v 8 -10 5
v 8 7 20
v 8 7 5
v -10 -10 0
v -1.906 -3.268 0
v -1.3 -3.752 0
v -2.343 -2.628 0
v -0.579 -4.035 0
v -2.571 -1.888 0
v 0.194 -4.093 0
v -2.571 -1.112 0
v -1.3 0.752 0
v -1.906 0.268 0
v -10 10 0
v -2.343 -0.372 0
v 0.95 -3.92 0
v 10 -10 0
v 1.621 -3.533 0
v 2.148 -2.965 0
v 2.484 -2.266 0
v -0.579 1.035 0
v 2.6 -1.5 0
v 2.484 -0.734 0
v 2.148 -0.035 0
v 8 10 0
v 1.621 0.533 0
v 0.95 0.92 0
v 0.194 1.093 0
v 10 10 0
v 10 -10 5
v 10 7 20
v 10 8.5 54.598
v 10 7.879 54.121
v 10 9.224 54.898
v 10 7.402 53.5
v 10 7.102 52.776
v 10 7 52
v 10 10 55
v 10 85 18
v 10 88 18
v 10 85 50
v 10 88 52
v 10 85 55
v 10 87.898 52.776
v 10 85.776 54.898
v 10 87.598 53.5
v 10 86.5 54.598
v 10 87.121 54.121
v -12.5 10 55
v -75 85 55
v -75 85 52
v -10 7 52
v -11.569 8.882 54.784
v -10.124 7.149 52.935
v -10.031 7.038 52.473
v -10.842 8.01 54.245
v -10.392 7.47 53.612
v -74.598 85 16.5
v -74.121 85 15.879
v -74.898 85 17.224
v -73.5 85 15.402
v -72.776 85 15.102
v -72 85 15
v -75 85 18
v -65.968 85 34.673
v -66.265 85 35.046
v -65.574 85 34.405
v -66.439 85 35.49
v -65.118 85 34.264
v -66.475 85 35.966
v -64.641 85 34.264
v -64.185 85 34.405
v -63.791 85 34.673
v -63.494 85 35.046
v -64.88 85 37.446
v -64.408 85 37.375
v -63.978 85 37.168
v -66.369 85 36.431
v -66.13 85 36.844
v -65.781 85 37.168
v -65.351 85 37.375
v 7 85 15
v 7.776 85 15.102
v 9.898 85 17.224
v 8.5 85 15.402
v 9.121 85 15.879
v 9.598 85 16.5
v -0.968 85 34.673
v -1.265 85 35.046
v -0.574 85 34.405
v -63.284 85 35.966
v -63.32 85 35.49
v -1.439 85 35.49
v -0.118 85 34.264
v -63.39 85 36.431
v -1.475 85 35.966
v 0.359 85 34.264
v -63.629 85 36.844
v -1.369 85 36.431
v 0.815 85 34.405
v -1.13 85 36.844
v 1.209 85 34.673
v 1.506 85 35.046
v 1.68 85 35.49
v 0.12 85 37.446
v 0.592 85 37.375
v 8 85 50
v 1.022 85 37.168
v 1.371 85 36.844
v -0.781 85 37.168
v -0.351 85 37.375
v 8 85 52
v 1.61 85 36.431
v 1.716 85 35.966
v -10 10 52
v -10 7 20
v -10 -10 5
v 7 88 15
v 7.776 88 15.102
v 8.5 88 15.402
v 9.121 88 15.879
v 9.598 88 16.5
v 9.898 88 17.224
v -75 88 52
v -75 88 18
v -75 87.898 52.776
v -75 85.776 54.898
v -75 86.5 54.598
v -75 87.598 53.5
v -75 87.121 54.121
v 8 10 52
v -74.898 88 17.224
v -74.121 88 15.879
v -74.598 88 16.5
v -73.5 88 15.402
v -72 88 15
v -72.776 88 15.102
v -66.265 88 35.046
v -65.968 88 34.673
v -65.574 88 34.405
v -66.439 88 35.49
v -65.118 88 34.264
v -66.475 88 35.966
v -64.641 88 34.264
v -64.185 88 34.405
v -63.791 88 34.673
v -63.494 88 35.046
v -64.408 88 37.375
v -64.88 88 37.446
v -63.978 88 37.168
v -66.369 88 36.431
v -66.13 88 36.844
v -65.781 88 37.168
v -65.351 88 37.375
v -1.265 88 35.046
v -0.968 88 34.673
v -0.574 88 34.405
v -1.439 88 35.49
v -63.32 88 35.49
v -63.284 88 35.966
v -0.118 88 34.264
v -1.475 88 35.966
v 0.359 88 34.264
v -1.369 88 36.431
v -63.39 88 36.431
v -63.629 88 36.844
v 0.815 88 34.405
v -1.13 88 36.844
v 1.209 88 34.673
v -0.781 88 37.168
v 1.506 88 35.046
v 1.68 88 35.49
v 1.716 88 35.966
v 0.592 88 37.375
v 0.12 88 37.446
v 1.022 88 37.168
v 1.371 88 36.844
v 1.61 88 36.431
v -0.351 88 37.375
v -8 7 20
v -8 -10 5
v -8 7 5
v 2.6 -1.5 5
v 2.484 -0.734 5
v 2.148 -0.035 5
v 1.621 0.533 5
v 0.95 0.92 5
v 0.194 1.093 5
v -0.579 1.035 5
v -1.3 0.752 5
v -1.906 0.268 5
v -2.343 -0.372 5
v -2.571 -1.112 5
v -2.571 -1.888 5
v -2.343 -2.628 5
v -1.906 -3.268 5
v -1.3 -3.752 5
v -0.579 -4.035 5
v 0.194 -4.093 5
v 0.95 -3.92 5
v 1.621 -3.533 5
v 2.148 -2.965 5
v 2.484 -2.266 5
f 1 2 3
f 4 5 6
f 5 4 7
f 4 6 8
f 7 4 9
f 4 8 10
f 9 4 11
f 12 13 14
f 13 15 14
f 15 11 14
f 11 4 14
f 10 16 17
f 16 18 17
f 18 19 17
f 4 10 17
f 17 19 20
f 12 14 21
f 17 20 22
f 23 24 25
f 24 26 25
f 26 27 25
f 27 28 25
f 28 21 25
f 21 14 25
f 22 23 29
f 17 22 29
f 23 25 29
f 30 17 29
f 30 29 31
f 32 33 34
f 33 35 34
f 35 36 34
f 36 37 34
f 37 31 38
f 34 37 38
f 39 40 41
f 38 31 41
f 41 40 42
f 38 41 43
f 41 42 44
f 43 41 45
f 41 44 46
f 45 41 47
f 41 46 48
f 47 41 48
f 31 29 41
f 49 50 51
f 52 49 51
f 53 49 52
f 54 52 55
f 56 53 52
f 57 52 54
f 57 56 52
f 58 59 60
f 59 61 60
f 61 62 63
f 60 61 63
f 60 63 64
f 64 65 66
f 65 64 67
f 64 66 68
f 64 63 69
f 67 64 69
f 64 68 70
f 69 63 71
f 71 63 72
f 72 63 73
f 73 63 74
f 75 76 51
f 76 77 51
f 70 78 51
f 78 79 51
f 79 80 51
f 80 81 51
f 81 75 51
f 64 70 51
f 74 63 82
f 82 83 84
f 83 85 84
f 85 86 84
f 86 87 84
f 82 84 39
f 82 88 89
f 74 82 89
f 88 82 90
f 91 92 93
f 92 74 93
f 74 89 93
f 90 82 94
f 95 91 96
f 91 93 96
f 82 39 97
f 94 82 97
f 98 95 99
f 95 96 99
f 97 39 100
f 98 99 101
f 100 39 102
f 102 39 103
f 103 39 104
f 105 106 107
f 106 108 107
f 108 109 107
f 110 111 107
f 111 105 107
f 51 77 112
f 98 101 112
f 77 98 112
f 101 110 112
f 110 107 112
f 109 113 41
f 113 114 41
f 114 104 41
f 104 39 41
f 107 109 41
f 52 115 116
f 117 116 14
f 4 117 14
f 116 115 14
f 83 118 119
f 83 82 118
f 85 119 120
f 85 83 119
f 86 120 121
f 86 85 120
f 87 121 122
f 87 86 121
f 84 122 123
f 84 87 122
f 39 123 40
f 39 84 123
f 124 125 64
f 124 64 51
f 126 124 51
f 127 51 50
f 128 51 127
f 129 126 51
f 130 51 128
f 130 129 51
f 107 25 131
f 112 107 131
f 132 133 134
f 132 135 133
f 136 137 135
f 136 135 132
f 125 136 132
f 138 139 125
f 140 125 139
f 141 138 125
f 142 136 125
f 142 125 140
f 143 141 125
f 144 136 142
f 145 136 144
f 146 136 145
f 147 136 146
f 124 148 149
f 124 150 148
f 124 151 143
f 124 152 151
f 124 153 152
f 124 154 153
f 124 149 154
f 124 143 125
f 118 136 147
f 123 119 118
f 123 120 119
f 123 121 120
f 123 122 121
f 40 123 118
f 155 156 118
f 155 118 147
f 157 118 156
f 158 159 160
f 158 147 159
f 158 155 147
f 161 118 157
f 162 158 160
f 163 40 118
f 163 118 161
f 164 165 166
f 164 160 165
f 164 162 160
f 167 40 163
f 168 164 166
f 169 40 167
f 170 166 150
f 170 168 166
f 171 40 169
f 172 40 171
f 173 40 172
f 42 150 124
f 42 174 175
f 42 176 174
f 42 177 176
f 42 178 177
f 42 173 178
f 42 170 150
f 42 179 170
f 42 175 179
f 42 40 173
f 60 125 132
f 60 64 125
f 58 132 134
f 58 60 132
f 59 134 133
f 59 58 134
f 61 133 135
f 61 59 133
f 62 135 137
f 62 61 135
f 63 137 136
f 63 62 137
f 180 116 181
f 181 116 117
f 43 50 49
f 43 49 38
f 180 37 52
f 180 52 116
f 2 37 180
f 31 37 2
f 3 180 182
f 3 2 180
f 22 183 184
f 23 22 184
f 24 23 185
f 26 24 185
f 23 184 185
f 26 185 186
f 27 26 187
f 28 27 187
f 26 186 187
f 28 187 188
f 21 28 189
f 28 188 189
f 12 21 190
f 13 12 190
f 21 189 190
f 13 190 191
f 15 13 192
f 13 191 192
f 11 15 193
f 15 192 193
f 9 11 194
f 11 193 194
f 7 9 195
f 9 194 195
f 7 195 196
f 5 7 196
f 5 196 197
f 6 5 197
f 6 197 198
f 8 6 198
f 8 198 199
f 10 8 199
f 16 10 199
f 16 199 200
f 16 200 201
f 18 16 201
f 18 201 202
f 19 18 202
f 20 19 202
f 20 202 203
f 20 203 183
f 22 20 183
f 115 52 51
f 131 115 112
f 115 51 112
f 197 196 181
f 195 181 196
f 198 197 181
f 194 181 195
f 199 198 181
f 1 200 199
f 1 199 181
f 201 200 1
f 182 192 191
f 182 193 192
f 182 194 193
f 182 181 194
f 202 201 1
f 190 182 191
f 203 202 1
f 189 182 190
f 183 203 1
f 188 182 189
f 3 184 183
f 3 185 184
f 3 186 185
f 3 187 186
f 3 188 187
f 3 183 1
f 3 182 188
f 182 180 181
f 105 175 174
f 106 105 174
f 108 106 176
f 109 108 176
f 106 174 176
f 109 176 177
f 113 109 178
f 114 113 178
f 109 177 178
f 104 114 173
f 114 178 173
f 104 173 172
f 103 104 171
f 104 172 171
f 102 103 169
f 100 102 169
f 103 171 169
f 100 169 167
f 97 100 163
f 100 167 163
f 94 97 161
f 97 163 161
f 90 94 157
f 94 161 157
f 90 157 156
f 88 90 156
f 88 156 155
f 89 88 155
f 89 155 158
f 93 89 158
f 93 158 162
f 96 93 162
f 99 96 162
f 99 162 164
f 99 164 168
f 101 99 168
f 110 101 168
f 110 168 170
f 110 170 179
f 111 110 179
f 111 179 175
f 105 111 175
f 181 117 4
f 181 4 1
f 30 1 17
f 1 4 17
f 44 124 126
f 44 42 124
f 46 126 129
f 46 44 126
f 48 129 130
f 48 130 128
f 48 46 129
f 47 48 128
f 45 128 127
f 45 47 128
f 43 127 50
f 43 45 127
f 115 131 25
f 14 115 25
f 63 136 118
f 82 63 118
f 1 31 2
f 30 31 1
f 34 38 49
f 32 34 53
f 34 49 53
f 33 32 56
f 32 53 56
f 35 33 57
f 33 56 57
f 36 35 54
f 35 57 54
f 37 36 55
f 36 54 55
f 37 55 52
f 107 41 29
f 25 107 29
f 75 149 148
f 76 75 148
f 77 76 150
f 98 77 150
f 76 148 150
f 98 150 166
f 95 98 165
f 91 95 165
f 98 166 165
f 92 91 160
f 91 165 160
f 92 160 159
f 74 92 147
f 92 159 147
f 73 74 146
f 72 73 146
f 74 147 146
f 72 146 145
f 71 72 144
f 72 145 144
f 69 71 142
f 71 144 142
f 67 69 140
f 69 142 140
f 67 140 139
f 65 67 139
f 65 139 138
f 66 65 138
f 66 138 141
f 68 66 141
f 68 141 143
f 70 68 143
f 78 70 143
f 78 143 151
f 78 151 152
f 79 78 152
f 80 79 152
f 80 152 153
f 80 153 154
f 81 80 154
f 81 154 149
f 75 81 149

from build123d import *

# Parameters (mm, degrees)
SKETCH1_W            = 20
SKETCH1_H            = 20
BOSS_EXTRUDE1_DEPTH  = 5
SKETCH2_W            = 20
SKETCH2_H            = 3
BOSS_EXTRUDE2_DEPTH  = 20
BOSS_EXTRUDE3_DEPTH  = 2
BOSS_EXTRUDE4_DEPTH  = 2
SKETCH5_R            = 2.6
CUT_EXTRUDE1_DEPTH   = 21.615528128
SKETCH6_W            = 20
SKETCH6_H            = 3
BOSS_EXTRUDE5_DEPTH  = 5
SKETCH17_W           = 30
SKETCH17_H           = 3
BOSS_EXTRUDE14_DEPTH = 20
SKETCH18_W           = 13
SKETCH18_H           = 78
BOSS_EXTRUDE17_DEPTH = 20
SKETCH20_W           = 10
SKETCH20_H           = 78
CUT_EXTRUDE3_DEPTH   = 106.683489723
BOSS_EXTRUDE20_DEPTH = 2
SKETCH24_W           = 20
SKETCH24_H           = 3
BOSS_EXTRUDE21_DEPTH = 42
SKETCH25_W           = 45
SKETCH25_H           = 3
BOSS_EXTRUDE22_DEPTH = 65
SKETCH26_W           = 85
SKETCH26_H           = 5
CUT_EXTRUDE4_DEPTH   = 28
BOSS_EXTRUDE24_DEPTH = 3
SKETCH28_R           = 1.6
CUT_EXTRUDE6_DEPTH   = 7
FILLET4_R            = 3
FILLET5_R            = 3


with BuildPart() as part:
    # Sketch1 → Boss-Extrude1 (new body)
    with BuildSketch(Plane.XY):
        Rectangle(SKETCH1_W, SKETCH1_H)
    extrude(amount=BOSS_EXTRUDE1_DEPTH)

    # Sketch2 → Boss-Extrude2 (add)
    with BuildSketch(Plane.XY):
        with Locations((0, 8.5)):
            Rectangle(SKETCH2_W, SKETCH2_H)
    extrude(amount=BOSS_EXTRUDE2_DEPTH)

    # Sketch3 → Boss-Extrude3 (add)
    with BuildSketch(Plane.ZY.offset(10)):
        Polygon((20, 7), (5, -10), (5, 7), align=None)
    extrude(amount=-BOSS_EXTRUDE3_DEPTH)

    # Sketch4 → Boss-Extrude4 (add)
    with BuildSketch(Plane(origin=(10, 0, 0), x_dir=(0, 0, -1), z_dir=(1, 0, 0))):
        Polygon((-20, 7), (-5, -10), (-5, 7), align=None)
    extrude(amount=-BOSS_EXTRUDE4_DEPTH)

    # Sketch5 → Cut-Extrude1 (cut, through all)
    with BuildSketch(Plane.XY.offset(5)):
        with Locations((0, -1.5)):
            Circle(SKETCH5_R)
    extrude(amount=-CUT_EXTRUDE1_DEPTH, mode=Mode.SUBTRACT)

    # Sketch6 → Boss-Extrude5 (add)
    with BuildSketch(Plane.XY.offset(20)):
        with Locations((0, 8.5)):
            Rectangle(SKETCH6_W, SKETCH6_H)
    extrude(amount=BOSS_EXTRUDE5_DEPTH)

    # Sketch17 → Boss-Extrude14 (add)
    with BuildSketch(Plane(origin=(10, 0, 0), x_dir=(0, 0, -1), z_dir=(1, 0, 0))):
        with Locations((-40, 8.5)):
            Rectangle(SKETCH17_W, SKETCH17_H)
    extrude(amount=-BOSS_EXTRUDE14_DEPTH)

    # Sketch18 → Boss-Extrude17 (add)
    with BuildSketch(Plane(origin=(10, 0, 0), x_dir=(0, 0, -1), z_dir=(1, 0, 0))):
        with Locations((-48.5, 49)):
            Rectangle(SKETCH18_W, SKETCH18_H)
    extrude(amount=-BOSS_EXTRUDE17_DEPTH)

    # Sketch20 → Cut-Extrude3 (cut, through all)
    with BuildSketch(Plane(origin=(10, 0, 0), x_dir=(0, 0, -1), z_dir=(1, 0, 0))):
        with Locations((-47, 49)):
            Rectangle(SKETCH20_W, SKETCH20_H)
    extrude(amount=-CUT_EXTRUDE3_DEPTH, mode=Mode.SUBTRACT)

    # Sketch23 → Boss-Extrude20 (add)
    with BuildSketch(Plane(origin=(10, 0, 0), x_dir=(0, 0, -1), z_dir=(1, 0, 0))):
        Polygon((-52, 88), (0, 10), (-52, 10), align=None)
    extrude(amount=-BOSS_EXTRUDE20_DEPTH)

    # Sketch24 → Boss-Extrude21 (add)
    with BuildSketch(Plane(origin=(0, 0, 52), x_dir=(-1, 0, 0), z_dir=(0, 0, -1))):
        with Locations((0, 86.5)):
            Rectangle(SKETCH24_W, SKETCH24_H)
    extrude(amount=BOSS_EXTRUDE21_DEPTH)

    # Sketch25 → Boss-Extrude22 (add)
    with BuildSketch(Plane.ZY.offset(10)):
        with Locations((32.5, 86.5)):
            Rectangle(SKETCH25_W, SKETCH25_H)
    extrude(amount=BOSS_EXTRUDE22_DEPTH)

    # Sketch26 → Cut-Extrude4 (cut)
    with BuildSketch(Plane(origin=(0, 88, 0), x_dir=(1, 0, 0), z_dir=(0, 1, 0))):
        with Locations((-32.5, -12.5)):
            Rectangle(SKETCH26_W, SKETCH26_H)
    extrude(amount=-CUT_EXTRUDE4_DEPTH, mode=Mode.SUBTRACT)

    # Sketch27 → Boss-Extrude24 (add)
    with BuildSketch(Plane.XY.offset(55)):
        Polygon((-75, 85), (-10, 7), (-10, 85), align=None)
    extrude(amount=-BOSS_EXTRUDE24_DEPTH)

    # Sketch28 → Cut-Extrude6 (cut)
    with BuildSketch(Plane(origin=(0, 88, 0), x_dir=(1, 0, 0), z_dir=(0, 1, 0))):
        with Locations(Location((0.120495814, -35.846198104, 0), (0, 0, 270))):
            Circle(SKETCH28_R)
        with Locations(Location((-64.879504186, -35.846198104, 0), (0, 0, 270))):
            Circle(SKETCH28_R)
    extrude(amount=-CUT_EXTRUDE6_DEPTH, mode=Mode.SUBTRACT)

    # Fillet4
    fillet4_edges = [part.edges().sort_by_distance(p)[0] for p in [
        (-75, 86.5, 15),
        (10, 86.5, 15),
    ]]
    fillet(fillet4_edges, radius=FILLET4_R)

    # Fillet5
    fillet5_edges = [part.edges().sort_by_distance(p)[0] for p in [
        (0, 7, 55),
        (-32.5, 88, 55),
    ]]
    fillet(fillet5_edges, radius=FILLET5_R)


solid = part.part
